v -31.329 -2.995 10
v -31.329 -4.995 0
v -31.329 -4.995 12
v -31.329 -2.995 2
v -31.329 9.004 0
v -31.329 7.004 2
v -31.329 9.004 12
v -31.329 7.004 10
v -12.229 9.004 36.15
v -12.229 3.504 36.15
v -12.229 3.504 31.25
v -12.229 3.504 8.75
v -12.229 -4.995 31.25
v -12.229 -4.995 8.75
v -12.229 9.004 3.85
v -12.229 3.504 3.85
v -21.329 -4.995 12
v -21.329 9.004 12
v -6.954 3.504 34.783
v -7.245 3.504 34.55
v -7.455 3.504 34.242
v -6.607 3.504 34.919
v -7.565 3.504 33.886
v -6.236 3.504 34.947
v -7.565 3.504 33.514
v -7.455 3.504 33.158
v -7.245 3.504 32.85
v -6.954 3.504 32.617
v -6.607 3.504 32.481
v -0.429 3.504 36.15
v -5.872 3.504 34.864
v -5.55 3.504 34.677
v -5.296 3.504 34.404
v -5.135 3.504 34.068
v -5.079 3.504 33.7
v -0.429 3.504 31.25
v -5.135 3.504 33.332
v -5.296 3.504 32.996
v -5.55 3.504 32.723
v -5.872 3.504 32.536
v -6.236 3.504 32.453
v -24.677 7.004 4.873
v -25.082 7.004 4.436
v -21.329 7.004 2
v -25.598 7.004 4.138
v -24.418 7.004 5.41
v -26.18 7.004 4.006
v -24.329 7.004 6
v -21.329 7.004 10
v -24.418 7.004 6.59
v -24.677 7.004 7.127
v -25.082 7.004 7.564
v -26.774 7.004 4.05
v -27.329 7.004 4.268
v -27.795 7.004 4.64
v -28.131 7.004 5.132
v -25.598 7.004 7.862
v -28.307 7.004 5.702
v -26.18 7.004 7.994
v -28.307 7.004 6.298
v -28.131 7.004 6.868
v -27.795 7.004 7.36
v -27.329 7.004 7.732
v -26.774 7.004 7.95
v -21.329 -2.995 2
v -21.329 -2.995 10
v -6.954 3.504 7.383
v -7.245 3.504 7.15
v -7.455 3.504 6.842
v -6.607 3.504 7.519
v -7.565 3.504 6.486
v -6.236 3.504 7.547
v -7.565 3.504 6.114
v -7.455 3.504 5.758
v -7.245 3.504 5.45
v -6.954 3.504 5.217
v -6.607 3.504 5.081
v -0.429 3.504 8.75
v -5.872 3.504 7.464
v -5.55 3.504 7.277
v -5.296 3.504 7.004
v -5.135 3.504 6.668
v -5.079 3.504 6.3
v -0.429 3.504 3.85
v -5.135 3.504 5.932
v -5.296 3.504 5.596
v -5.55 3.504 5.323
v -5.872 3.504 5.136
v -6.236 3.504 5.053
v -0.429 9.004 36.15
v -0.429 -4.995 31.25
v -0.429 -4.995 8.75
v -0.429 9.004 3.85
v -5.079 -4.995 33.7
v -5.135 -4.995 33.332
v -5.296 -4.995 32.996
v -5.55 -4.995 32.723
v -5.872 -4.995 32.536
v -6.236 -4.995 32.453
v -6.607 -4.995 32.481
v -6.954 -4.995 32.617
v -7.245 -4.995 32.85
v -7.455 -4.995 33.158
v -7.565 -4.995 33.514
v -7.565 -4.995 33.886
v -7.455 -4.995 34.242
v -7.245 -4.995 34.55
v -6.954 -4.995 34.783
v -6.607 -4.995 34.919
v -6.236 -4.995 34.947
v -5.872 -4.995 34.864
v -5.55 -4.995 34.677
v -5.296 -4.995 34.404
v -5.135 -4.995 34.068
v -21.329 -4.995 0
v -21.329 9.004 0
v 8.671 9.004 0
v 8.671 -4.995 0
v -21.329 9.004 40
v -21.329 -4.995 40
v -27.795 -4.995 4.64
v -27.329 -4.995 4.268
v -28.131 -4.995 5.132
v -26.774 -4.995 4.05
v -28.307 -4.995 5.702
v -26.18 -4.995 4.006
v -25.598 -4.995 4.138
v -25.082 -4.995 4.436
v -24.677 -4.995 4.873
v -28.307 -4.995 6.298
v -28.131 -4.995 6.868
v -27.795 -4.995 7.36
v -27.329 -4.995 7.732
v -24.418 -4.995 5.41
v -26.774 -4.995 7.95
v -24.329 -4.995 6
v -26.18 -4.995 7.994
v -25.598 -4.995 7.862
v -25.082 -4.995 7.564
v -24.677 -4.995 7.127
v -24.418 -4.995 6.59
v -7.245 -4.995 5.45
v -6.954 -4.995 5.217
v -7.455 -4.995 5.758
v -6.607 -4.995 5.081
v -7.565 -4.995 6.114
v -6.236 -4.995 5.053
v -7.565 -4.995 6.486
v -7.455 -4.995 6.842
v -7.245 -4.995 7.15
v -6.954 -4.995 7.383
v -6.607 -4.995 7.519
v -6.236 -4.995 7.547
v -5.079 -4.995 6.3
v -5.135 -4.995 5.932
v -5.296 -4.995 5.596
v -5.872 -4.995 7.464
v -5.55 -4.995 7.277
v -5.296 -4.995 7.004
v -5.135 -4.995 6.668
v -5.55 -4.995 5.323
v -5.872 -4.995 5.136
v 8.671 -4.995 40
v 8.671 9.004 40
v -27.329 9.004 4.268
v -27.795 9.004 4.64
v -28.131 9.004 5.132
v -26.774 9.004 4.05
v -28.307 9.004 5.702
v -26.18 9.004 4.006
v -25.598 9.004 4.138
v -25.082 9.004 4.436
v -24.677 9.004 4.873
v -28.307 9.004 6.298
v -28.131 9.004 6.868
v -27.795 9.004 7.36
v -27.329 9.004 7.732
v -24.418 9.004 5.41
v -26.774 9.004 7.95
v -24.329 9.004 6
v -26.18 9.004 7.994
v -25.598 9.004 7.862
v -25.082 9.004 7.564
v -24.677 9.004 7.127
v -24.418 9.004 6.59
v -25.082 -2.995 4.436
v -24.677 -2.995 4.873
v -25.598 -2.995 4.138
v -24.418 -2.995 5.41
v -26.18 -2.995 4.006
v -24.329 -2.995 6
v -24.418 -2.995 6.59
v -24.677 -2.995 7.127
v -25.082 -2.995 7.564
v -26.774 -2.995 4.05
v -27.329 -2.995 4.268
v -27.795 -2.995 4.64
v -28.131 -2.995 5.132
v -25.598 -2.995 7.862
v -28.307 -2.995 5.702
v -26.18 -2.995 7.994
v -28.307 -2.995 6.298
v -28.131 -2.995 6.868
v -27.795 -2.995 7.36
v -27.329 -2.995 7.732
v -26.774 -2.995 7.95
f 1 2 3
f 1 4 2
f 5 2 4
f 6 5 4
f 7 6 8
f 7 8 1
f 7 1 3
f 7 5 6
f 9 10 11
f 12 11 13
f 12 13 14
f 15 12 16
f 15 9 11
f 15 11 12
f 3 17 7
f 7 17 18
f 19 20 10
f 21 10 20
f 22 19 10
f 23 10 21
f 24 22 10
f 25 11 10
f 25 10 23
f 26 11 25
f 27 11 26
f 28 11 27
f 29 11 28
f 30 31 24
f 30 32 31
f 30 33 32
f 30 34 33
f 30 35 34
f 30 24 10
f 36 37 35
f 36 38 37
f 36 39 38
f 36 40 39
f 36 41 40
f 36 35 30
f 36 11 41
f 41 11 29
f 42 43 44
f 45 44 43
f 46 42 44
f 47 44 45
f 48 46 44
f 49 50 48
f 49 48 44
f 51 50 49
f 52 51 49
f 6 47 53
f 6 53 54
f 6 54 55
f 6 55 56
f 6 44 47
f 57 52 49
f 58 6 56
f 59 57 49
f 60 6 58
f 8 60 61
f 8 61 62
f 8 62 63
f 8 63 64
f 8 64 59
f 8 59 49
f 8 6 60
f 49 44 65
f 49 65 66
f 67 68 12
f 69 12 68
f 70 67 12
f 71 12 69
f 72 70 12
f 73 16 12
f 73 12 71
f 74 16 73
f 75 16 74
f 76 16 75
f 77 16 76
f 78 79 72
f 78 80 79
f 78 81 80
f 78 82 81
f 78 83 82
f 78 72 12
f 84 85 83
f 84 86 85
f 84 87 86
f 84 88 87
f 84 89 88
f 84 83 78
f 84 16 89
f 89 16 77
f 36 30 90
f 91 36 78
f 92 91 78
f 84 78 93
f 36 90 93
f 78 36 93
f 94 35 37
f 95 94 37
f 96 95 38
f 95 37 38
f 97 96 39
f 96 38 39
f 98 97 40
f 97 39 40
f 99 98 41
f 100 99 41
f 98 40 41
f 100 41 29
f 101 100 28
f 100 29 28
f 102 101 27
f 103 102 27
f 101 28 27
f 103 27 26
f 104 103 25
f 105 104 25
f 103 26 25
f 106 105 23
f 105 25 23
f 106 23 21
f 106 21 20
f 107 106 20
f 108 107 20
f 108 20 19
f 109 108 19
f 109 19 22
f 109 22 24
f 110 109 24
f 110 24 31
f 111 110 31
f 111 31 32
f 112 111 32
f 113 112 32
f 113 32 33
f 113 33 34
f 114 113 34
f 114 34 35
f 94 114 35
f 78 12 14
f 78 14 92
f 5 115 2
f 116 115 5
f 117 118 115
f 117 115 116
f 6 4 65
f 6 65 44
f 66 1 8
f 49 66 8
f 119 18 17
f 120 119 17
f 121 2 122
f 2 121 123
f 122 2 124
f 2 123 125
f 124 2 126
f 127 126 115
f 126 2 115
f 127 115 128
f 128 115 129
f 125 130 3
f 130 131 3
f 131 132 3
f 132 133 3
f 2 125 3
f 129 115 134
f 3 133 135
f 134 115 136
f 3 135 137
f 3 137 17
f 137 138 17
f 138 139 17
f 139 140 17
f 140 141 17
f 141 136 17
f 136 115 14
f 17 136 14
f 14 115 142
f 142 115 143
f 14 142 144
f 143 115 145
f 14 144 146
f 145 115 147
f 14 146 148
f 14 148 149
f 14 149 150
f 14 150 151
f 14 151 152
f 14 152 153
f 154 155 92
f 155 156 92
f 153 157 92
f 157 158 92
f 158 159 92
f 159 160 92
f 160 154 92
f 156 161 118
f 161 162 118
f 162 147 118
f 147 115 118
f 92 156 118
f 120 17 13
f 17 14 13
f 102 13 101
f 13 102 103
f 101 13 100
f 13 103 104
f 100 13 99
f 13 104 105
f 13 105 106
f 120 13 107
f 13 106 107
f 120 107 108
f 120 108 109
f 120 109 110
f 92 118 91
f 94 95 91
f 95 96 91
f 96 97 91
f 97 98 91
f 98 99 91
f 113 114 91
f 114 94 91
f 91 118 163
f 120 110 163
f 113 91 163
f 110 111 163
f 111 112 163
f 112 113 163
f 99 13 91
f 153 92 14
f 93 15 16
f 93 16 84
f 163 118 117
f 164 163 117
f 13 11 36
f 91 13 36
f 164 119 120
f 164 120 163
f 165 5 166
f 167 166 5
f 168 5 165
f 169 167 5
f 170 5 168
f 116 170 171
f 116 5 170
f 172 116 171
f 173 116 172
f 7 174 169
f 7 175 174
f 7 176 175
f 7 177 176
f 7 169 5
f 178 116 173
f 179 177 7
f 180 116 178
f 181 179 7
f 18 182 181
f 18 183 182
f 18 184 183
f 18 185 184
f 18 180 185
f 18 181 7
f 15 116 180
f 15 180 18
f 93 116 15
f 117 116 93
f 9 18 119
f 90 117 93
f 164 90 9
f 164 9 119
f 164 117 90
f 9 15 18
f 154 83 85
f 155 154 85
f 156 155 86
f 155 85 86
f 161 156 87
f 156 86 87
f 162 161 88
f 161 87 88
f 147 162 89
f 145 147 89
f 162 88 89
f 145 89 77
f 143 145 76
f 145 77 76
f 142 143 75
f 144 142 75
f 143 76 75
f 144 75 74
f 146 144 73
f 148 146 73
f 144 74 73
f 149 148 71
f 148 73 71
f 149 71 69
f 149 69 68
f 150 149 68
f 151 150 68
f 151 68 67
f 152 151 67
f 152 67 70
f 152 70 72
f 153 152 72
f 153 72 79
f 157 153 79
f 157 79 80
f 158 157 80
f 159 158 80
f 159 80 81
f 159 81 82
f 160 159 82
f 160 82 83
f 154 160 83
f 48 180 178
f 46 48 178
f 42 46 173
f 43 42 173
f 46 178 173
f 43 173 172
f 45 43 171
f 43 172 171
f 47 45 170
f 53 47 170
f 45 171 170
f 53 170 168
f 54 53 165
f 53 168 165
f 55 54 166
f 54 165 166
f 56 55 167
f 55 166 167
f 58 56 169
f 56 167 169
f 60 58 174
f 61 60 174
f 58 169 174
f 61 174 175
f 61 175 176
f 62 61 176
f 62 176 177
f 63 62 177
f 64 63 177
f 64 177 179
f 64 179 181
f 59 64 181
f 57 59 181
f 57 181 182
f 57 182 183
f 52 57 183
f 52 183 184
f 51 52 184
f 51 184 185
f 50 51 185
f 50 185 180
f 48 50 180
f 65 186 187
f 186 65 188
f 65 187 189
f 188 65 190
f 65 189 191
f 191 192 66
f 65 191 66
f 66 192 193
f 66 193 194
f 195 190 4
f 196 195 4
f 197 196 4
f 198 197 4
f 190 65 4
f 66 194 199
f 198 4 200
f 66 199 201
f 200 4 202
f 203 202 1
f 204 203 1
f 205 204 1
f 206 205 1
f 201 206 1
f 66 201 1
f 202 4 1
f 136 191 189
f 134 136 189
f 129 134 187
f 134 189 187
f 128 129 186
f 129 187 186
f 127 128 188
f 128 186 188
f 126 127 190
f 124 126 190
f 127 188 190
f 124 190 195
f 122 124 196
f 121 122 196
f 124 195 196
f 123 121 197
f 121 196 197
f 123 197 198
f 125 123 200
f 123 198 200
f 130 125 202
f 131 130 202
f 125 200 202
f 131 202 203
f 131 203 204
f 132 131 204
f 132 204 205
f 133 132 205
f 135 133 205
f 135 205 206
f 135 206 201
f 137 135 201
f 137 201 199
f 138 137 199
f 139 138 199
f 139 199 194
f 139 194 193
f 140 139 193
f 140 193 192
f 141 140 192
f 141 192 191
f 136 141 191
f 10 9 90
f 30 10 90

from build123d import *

# Parameters (mm, degrees)
BOSS_EXTRUDE1_DEPTH = 40
SKETCH4_W           = 11.8
SKETCH4_H           = 32.3
CUT_EXTRUDE1_DEPTH  = 5.5
SKETCH5_W           = 11.8
SKETCH5_H           = 22.5
CUT_EXTRUDE2_DEPTH  = 9.498848241
SKETCH6_R           = 1.25
CUT_EXTRUDE3_DEPTH  = 9.498848241
SKETCH7_W           = 12
SKETCH7_H           = 13.998848241
BOSS_EXTRUDE2_DEPTH = 10
SKETCH8_W           = 8
SKETCH8_H           = 9.998848241
CUT_EXTRUDE6_DEPTH  = 10
SKETCH9_R           = 2
CUT_EXTRUDE7_DEPTH  = 14.998848241


with BuildPart() as part:
    # Sketch1 → Boss-Extrude1 (new body)
    with BuildSketch(Plane.XY):
        Polygon((8.670952565, 9.003587153), (-11.329047435, 9.003587153), (-21.329047435, 9.003587153), (-21.329047435, -4.995261088), (-11.329047435, -4.995261088), (8.670952565, -4.995261088), align=None)
    extrude(amount=BOSS_EXTRUDE1_DEPTH)

    # Sketch4 → Cut-Extrude1 (cut)
    with BuildSketch(Plane(origin=(0, 9.003587153, 0), x_dir=(1, 0, 0), z_dir=(0, 1, 0))):
        with Locations((-6.329047435, -20)):
            Rectangle(SKETCH4_W, SKETCH4_H)
    extrude(amount=-CUT_EXTRUDE1_DEPTH, mode=Mode.SUBTRACT)

    # Sketch5 → Cut-Extrude2 (cut, through all)
    with BuildSketch(Plane(origin=(0, 3.503587153, 0), x_dir=(1, 0, 0), z_dir=(0, 1, 0))):
        with Locations((-6.329047435, -20)):
            Rectangle(SKETCH5_W, SKETCH5_H)
    extrude(amount=-CUT_EXTRUDE2_DEPTH, mode=Mode.SUBTRACT)

    # Sketch6 → Cut-Extrude3 (cut, through all)
    with BuildSketch(Plane(origin=(0, 3.503587153, 0), x_dir=(1, 0, 0), z_dir=(0, 1, 0))):
        with Locations((-6.329047435, -6.3)):
            Circle(SKETCH6_R)
        with Locations((-6.329047435, -33.7)):
            Circle(SKETCH6_R)
    extrude(amount=-CUT_EXTRUDE3_DEPTH, mode=Mode.SUBTRACT)

    # Sketch7 → Boss-Extrude2 (add)
    with BuildSketch(Plane.ZY.offset(21.329047435)):
        with Locations((6, 2.004163032)):
            Rectangle(SKETCH7_W, SKETCH7_H)
    extrude(amount=BOSS_EXTRUDE2_DEPTH)

    # Sketch8 → Cut-Extrude6 (cut)
    with BuildSketch(Plane.ZY.offset(31.329047435)):
        with Locations((6, 2.004163033)):
            Rectangle(SKETCH8_W, SKETCH8_H)
    extrude(amount=-CUT_EXTRUDE6_DEPTH, mode=Mode.SUBTRACT)

    # Sketch9 → Cut-Extrude7 (cut, through all)
    with BuildSketch(Plane(origin=(0, 9.003587153, 0), x_dir=(1, 0, 0), z_dir=(0, 1, 0))):
        with Locations((-26.329047435, -6)):
            Circle(SKETCH9_R)
    extrude(amount=-CUT_EXTRUDE7_DEPTH, mode=Mode.SUBTRACT)


solid = part.part
